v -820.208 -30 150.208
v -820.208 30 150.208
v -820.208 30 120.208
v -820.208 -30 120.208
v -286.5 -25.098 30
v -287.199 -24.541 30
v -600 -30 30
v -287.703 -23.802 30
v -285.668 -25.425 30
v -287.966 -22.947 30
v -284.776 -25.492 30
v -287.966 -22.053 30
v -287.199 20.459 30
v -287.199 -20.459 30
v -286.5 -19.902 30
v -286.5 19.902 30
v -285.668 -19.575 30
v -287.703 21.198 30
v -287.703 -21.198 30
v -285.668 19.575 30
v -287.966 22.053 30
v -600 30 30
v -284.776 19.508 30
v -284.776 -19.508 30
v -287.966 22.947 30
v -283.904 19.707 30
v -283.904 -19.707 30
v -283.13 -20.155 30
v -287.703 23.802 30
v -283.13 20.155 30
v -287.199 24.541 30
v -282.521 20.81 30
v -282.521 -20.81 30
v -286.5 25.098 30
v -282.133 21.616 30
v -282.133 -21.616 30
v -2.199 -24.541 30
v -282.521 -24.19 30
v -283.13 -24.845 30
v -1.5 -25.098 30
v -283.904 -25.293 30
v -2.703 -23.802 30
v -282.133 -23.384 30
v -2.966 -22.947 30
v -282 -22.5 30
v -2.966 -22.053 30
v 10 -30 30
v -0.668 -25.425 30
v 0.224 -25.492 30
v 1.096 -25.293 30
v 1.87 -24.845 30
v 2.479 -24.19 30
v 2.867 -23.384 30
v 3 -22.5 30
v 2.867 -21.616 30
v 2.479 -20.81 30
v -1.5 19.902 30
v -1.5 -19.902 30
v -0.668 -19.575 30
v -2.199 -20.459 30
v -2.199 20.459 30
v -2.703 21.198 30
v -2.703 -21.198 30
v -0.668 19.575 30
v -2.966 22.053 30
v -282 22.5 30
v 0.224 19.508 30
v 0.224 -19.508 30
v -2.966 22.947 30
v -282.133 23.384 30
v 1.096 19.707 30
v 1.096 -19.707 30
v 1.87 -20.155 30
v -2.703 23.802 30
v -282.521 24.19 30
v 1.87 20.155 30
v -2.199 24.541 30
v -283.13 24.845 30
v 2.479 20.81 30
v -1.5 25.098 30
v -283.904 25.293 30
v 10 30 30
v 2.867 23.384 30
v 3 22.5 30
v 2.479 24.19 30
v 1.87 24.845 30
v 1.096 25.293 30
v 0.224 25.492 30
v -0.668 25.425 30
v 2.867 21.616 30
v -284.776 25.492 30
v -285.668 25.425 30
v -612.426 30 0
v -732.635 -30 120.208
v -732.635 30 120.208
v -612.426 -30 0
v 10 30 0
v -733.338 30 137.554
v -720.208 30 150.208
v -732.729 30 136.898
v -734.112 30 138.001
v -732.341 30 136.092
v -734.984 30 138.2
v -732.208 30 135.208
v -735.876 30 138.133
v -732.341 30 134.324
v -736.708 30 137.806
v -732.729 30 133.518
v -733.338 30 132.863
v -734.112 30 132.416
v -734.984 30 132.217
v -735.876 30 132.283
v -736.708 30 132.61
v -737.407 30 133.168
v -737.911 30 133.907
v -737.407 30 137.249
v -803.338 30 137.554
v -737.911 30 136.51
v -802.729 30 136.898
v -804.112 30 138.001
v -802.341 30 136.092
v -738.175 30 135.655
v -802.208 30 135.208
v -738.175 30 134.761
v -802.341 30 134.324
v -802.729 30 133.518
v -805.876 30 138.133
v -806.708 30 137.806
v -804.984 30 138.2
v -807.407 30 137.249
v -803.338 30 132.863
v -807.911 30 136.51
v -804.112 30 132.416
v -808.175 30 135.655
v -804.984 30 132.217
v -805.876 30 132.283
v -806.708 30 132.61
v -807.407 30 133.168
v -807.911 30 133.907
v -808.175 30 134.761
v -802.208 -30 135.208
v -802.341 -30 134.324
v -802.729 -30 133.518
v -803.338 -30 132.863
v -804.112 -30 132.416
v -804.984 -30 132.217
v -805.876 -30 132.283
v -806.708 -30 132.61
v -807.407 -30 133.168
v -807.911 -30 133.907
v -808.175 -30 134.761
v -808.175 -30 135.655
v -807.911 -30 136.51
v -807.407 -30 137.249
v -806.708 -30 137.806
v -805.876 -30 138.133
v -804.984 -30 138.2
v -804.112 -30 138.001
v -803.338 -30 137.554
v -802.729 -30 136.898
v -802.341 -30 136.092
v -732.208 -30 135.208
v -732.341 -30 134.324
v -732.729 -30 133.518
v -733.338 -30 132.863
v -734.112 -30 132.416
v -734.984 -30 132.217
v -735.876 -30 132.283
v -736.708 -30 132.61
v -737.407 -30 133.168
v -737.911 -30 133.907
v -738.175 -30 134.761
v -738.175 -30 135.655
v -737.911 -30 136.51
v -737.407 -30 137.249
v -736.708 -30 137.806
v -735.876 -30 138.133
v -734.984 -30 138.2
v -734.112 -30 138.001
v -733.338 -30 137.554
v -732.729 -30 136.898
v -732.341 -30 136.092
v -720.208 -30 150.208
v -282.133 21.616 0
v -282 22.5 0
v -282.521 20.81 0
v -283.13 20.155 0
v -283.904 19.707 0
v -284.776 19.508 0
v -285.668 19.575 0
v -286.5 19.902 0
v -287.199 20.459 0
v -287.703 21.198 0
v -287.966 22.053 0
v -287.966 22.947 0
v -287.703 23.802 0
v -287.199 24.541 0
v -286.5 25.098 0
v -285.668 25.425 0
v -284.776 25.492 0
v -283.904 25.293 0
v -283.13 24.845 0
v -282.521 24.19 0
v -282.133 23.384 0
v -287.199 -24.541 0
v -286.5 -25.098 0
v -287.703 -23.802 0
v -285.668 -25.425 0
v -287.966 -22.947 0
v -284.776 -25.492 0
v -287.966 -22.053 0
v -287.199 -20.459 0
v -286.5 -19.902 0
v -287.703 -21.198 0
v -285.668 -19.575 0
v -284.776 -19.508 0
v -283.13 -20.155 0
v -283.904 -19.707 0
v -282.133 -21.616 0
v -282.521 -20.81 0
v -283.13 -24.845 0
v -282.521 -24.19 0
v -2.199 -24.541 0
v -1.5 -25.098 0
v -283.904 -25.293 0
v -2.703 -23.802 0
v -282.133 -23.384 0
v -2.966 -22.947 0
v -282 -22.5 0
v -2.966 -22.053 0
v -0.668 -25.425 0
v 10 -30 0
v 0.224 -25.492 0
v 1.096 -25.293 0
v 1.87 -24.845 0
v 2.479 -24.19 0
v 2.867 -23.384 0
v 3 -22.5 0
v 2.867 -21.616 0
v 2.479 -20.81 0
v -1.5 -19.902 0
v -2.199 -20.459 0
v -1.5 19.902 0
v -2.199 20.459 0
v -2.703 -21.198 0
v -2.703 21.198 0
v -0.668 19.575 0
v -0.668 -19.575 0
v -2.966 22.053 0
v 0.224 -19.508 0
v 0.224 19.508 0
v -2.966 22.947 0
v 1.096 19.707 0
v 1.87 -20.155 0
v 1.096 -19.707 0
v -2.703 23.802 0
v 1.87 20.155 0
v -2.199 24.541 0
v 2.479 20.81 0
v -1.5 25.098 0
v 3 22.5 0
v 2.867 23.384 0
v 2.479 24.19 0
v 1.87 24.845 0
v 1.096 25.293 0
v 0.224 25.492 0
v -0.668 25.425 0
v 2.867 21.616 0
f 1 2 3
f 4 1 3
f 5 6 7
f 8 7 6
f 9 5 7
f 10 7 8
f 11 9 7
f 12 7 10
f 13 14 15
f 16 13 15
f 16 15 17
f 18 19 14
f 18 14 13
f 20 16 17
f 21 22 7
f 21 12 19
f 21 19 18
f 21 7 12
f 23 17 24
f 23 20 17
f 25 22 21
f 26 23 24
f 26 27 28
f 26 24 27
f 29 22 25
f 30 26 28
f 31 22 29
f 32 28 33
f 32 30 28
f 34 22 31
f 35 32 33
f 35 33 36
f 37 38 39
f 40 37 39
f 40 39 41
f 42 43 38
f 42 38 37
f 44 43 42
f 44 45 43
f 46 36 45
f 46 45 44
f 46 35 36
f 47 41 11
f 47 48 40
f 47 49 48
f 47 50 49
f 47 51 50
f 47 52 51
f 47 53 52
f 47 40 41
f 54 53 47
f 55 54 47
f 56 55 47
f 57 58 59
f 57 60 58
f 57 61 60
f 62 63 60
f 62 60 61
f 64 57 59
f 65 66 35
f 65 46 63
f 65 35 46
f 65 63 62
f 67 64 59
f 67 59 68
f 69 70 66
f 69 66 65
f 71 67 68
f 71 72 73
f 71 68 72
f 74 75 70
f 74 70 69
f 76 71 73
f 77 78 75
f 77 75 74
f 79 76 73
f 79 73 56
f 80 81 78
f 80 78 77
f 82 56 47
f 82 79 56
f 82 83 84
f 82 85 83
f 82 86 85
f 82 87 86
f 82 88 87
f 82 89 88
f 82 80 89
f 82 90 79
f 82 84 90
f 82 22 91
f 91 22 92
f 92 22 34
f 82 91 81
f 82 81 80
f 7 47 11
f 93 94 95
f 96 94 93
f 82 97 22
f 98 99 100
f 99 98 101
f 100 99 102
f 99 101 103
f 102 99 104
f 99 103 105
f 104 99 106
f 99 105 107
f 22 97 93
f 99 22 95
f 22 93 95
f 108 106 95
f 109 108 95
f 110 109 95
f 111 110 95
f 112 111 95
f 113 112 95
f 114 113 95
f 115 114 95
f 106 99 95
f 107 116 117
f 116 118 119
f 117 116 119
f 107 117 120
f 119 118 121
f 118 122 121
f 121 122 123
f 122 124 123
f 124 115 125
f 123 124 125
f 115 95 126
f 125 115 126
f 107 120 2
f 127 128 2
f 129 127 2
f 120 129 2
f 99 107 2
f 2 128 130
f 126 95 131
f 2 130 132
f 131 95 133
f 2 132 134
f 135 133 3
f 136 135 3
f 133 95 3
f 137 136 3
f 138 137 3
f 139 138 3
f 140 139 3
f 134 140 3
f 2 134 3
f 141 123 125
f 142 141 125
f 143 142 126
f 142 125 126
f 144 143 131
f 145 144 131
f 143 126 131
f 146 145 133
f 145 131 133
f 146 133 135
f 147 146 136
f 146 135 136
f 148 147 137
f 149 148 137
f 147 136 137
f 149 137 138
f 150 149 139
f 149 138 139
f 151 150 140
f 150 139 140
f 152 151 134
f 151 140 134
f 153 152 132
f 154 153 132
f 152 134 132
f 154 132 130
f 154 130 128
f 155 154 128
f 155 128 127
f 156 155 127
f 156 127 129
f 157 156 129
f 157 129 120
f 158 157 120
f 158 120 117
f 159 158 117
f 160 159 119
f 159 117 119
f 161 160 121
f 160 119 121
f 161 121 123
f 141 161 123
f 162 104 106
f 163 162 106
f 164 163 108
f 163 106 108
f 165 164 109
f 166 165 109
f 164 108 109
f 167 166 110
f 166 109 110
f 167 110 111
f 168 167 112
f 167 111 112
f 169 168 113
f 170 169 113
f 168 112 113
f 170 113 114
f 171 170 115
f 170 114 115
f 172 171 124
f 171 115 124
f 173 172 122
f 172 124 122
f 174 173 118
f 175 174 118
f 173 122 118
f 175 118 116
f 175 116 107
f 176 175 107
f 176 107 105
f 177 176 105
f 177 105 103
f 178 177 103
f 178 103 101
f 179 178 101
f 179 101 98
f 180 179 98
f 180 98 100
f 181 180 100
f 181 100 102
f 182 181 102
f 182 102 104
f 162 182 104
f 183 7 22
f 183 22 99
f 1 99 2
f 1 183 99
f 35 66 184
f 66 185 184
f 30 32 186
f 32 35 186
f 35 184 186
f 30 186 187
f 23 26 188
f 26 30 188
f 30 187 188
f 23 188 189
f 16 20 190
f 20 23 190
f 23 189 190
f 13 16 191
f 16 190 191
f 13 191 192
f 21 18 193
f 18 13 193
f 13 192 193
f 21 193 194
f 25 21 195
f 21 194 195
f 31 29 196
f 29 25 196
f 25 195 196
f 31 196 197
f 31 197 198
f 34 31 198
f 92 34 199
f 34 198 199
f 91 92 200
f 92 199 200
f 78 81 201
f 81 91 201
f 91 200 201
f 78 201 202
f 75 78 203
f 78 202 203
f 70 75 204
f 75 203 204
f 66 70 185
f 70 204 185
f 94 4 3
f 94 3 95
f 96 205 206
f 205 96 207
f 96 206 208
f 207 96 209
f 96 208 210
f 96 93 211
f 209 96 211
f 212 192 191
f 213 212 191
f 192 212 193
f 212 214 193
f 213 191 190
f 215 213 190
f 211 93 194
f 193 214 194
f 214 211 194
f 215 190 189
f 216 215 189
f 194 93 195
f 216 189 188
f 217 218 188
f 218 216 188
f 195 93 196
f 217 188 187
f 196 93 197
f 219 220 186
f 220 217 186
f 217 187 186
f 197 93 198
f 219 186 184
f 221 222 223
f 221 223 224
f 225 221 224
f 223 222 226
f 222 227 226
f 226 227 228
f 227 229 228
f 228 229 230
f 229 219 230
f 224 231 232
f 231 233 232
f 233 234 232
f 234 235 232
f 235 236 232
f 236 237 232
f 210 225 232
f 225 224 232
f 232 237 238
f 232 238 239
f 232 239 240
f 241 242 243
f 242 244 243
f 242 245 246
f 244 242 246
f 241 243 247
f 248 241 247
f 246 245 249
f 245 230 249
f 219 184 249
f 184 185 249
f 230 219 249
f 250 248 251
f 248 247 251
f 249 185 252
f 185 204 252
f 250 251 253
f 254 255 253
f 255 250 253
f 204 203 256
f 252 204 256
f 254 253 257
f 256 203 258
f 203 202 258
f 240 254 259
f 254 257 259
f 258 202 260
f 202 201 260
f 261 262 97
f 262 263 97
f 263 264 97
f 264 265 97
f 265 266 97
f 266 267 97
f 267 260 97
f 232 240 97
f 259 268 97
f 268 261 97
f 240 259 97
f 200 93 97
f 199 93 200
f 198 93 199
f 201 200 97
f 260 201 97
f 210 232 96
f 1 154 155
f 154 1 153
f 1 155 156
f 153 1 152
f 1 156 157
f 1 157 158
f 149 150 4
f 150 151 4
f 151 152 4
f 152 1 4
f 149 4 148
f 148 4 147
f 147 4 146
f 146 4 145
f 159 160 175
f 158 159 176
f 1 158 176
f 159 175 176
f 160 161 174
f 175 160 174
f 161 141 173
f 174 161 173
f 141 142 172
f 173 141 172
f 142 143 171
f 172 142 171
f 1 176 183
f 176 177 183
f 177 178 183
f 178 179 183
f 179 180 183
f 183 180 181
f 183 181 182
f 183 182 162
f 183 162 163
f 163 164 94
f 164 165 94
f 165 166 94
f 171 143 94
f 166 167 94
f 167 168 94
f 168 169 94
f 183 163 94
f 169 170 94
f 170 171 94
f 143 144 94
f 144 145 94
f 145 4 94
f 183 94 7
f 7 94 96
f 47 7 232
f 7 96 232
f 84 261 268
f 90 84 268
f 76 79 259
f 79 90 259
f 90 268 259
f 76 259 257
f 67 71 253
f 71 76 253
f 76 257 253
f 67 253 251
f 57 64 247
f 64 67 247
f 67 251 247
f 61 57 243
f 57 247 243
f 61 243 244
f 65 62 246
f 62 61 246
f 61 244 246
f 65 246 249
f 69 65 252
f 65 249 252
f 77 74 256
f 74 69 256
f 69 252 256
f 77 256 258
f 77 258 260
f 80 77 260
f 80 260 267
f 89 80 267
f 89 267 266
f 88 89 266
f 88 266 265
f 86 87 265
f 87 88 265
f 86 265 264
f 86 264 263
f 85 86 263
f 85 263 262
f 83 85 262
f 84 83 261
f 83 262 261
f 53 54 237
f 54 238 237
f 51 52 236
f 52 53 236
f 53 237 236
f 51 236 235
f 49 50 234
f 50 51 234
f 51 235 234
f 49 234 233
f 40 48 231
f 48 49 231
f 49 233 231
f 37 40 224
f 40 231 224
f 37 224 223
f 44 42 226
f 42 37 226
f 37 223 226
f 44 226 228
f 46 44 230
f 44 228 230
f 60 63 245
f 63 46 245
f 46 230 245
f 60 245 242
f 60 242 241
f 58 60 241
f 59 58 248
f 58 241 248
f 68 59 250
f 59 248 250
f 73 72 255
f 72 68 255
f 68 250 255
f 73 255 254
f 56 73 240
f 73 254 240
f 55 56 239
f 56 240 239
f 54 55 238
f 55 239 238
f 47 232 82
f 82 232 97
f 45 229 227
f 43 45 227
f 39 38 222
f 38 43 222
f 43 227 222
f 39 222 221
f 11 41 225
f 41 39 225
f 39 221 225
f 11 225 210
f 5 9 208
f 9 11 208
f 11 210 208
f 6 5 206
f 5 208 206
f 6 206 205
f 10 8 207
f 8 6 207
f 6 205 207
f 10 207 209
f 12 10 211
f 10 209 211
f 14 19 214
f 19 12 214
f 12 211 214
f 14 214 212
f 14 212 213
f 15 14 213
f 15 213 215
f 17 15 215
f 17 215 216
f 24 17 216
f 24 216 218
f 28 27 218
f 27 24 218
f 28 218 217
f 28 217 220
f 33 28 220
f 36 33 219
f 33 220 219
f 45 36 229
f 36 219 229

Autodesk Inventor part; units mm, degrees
ref_plane "YZ Plane" through (0, 0, 0) normal (1, 0, 0) x (0, 1, 0)
ref_plane "XZ Plane" through (0, 0, 0) normal (0, 1, 0) x (-1, 0, 0)
ref_plane "XY Plane" through (0, 0, 0) normal (0, 0, 1) x (1, 0, 0)
sketch "草圖1" plane through (0, 0, 0) normal (0, 0, 1) x (1, 0, 0)
  line L0 (-10, -30) -> (10, 30) construction
  line L1 (10, -30) -> (-10, 30) construction
  line L2 (10, 30) -> (-600, 30)
  line L3 (-600, 30) -> (-600, -30)
  line L4 (-600, -30) -> (10, -30)
  line L5 (10, -30) -> (10, 30)
  circle A0 centre (0, 22.5) radius 3
  circle A1 centre (0, -22.5) radius 3
  circle A2 centre (-285, 22.5) radius 3
  circle A3 centre (-285, -22.5) radius 3
  point P0 (0, 0)
  dimension "d0" = 20
  dimension "d1" = 60
  dimension "d2" = 610
  dimension "d4" = 6
  dimension "d5" = 6
  dimension "d8" = 6
  dimension "d9" = 6
extrude "擠出1" add sketch "草圖1" along normal blind 30
sketch "草圖2" plane through (-600, -30, 0) normal (0, -1, 0) x (1, 0, 0)
  line L0 (0, 30) -> (-120.2082, 150.2082)
  line L1 (0, 30) -> (170, 30) construction
  line L2 (-120.2082, 150.2082) -> (-141.4214, 128.9949)
  line L3 (-141.4214, 128.9949) -> (-12.4264, 0)
  line L4 (0, 0) -> (610, 0) projected
  line L5 (-12.4264, 0) -> (0, 0)
  line L6 (0, 0) -> (0, 30)
  line L7 (-120.2082, 150.2082) -> (-220.2082, 150.2082)
  line L8 (-220.2082, 150.2082) -> (-220.2082, 120.2082)
  line L9 (-220.2082, 120.2082) -> (-132.6346, 120.2082)
  point P0 (600, 0)
  dimension "d13" = 170
  dimension "d14" = 135
  dimension "d15" = 30
  dimension "d16" = 100
  dimension "d17" = 30
extrude "擠出2" add sketch "草圖2" against normal blind 60
sketch "草圖3" plane through (10, 30, 30) normal (0, 1, 0) x (1, 0, 0)
  line L0 (-830.2082, -90.2082) -> (-830.2082, -120.2082) projected
  circle A0 centre (-815.2082, -105.2082) radius 3
  circle A1 centre (-745.2082, -105.2082) radius 3
  point P0 (-10, 30)
  dimension "d22" = 6
  dimension "d23" = 6
extrude "擠出3" cut sketch "草圖3" along normal through all both and the other way through all
properties part number "DOF2"
